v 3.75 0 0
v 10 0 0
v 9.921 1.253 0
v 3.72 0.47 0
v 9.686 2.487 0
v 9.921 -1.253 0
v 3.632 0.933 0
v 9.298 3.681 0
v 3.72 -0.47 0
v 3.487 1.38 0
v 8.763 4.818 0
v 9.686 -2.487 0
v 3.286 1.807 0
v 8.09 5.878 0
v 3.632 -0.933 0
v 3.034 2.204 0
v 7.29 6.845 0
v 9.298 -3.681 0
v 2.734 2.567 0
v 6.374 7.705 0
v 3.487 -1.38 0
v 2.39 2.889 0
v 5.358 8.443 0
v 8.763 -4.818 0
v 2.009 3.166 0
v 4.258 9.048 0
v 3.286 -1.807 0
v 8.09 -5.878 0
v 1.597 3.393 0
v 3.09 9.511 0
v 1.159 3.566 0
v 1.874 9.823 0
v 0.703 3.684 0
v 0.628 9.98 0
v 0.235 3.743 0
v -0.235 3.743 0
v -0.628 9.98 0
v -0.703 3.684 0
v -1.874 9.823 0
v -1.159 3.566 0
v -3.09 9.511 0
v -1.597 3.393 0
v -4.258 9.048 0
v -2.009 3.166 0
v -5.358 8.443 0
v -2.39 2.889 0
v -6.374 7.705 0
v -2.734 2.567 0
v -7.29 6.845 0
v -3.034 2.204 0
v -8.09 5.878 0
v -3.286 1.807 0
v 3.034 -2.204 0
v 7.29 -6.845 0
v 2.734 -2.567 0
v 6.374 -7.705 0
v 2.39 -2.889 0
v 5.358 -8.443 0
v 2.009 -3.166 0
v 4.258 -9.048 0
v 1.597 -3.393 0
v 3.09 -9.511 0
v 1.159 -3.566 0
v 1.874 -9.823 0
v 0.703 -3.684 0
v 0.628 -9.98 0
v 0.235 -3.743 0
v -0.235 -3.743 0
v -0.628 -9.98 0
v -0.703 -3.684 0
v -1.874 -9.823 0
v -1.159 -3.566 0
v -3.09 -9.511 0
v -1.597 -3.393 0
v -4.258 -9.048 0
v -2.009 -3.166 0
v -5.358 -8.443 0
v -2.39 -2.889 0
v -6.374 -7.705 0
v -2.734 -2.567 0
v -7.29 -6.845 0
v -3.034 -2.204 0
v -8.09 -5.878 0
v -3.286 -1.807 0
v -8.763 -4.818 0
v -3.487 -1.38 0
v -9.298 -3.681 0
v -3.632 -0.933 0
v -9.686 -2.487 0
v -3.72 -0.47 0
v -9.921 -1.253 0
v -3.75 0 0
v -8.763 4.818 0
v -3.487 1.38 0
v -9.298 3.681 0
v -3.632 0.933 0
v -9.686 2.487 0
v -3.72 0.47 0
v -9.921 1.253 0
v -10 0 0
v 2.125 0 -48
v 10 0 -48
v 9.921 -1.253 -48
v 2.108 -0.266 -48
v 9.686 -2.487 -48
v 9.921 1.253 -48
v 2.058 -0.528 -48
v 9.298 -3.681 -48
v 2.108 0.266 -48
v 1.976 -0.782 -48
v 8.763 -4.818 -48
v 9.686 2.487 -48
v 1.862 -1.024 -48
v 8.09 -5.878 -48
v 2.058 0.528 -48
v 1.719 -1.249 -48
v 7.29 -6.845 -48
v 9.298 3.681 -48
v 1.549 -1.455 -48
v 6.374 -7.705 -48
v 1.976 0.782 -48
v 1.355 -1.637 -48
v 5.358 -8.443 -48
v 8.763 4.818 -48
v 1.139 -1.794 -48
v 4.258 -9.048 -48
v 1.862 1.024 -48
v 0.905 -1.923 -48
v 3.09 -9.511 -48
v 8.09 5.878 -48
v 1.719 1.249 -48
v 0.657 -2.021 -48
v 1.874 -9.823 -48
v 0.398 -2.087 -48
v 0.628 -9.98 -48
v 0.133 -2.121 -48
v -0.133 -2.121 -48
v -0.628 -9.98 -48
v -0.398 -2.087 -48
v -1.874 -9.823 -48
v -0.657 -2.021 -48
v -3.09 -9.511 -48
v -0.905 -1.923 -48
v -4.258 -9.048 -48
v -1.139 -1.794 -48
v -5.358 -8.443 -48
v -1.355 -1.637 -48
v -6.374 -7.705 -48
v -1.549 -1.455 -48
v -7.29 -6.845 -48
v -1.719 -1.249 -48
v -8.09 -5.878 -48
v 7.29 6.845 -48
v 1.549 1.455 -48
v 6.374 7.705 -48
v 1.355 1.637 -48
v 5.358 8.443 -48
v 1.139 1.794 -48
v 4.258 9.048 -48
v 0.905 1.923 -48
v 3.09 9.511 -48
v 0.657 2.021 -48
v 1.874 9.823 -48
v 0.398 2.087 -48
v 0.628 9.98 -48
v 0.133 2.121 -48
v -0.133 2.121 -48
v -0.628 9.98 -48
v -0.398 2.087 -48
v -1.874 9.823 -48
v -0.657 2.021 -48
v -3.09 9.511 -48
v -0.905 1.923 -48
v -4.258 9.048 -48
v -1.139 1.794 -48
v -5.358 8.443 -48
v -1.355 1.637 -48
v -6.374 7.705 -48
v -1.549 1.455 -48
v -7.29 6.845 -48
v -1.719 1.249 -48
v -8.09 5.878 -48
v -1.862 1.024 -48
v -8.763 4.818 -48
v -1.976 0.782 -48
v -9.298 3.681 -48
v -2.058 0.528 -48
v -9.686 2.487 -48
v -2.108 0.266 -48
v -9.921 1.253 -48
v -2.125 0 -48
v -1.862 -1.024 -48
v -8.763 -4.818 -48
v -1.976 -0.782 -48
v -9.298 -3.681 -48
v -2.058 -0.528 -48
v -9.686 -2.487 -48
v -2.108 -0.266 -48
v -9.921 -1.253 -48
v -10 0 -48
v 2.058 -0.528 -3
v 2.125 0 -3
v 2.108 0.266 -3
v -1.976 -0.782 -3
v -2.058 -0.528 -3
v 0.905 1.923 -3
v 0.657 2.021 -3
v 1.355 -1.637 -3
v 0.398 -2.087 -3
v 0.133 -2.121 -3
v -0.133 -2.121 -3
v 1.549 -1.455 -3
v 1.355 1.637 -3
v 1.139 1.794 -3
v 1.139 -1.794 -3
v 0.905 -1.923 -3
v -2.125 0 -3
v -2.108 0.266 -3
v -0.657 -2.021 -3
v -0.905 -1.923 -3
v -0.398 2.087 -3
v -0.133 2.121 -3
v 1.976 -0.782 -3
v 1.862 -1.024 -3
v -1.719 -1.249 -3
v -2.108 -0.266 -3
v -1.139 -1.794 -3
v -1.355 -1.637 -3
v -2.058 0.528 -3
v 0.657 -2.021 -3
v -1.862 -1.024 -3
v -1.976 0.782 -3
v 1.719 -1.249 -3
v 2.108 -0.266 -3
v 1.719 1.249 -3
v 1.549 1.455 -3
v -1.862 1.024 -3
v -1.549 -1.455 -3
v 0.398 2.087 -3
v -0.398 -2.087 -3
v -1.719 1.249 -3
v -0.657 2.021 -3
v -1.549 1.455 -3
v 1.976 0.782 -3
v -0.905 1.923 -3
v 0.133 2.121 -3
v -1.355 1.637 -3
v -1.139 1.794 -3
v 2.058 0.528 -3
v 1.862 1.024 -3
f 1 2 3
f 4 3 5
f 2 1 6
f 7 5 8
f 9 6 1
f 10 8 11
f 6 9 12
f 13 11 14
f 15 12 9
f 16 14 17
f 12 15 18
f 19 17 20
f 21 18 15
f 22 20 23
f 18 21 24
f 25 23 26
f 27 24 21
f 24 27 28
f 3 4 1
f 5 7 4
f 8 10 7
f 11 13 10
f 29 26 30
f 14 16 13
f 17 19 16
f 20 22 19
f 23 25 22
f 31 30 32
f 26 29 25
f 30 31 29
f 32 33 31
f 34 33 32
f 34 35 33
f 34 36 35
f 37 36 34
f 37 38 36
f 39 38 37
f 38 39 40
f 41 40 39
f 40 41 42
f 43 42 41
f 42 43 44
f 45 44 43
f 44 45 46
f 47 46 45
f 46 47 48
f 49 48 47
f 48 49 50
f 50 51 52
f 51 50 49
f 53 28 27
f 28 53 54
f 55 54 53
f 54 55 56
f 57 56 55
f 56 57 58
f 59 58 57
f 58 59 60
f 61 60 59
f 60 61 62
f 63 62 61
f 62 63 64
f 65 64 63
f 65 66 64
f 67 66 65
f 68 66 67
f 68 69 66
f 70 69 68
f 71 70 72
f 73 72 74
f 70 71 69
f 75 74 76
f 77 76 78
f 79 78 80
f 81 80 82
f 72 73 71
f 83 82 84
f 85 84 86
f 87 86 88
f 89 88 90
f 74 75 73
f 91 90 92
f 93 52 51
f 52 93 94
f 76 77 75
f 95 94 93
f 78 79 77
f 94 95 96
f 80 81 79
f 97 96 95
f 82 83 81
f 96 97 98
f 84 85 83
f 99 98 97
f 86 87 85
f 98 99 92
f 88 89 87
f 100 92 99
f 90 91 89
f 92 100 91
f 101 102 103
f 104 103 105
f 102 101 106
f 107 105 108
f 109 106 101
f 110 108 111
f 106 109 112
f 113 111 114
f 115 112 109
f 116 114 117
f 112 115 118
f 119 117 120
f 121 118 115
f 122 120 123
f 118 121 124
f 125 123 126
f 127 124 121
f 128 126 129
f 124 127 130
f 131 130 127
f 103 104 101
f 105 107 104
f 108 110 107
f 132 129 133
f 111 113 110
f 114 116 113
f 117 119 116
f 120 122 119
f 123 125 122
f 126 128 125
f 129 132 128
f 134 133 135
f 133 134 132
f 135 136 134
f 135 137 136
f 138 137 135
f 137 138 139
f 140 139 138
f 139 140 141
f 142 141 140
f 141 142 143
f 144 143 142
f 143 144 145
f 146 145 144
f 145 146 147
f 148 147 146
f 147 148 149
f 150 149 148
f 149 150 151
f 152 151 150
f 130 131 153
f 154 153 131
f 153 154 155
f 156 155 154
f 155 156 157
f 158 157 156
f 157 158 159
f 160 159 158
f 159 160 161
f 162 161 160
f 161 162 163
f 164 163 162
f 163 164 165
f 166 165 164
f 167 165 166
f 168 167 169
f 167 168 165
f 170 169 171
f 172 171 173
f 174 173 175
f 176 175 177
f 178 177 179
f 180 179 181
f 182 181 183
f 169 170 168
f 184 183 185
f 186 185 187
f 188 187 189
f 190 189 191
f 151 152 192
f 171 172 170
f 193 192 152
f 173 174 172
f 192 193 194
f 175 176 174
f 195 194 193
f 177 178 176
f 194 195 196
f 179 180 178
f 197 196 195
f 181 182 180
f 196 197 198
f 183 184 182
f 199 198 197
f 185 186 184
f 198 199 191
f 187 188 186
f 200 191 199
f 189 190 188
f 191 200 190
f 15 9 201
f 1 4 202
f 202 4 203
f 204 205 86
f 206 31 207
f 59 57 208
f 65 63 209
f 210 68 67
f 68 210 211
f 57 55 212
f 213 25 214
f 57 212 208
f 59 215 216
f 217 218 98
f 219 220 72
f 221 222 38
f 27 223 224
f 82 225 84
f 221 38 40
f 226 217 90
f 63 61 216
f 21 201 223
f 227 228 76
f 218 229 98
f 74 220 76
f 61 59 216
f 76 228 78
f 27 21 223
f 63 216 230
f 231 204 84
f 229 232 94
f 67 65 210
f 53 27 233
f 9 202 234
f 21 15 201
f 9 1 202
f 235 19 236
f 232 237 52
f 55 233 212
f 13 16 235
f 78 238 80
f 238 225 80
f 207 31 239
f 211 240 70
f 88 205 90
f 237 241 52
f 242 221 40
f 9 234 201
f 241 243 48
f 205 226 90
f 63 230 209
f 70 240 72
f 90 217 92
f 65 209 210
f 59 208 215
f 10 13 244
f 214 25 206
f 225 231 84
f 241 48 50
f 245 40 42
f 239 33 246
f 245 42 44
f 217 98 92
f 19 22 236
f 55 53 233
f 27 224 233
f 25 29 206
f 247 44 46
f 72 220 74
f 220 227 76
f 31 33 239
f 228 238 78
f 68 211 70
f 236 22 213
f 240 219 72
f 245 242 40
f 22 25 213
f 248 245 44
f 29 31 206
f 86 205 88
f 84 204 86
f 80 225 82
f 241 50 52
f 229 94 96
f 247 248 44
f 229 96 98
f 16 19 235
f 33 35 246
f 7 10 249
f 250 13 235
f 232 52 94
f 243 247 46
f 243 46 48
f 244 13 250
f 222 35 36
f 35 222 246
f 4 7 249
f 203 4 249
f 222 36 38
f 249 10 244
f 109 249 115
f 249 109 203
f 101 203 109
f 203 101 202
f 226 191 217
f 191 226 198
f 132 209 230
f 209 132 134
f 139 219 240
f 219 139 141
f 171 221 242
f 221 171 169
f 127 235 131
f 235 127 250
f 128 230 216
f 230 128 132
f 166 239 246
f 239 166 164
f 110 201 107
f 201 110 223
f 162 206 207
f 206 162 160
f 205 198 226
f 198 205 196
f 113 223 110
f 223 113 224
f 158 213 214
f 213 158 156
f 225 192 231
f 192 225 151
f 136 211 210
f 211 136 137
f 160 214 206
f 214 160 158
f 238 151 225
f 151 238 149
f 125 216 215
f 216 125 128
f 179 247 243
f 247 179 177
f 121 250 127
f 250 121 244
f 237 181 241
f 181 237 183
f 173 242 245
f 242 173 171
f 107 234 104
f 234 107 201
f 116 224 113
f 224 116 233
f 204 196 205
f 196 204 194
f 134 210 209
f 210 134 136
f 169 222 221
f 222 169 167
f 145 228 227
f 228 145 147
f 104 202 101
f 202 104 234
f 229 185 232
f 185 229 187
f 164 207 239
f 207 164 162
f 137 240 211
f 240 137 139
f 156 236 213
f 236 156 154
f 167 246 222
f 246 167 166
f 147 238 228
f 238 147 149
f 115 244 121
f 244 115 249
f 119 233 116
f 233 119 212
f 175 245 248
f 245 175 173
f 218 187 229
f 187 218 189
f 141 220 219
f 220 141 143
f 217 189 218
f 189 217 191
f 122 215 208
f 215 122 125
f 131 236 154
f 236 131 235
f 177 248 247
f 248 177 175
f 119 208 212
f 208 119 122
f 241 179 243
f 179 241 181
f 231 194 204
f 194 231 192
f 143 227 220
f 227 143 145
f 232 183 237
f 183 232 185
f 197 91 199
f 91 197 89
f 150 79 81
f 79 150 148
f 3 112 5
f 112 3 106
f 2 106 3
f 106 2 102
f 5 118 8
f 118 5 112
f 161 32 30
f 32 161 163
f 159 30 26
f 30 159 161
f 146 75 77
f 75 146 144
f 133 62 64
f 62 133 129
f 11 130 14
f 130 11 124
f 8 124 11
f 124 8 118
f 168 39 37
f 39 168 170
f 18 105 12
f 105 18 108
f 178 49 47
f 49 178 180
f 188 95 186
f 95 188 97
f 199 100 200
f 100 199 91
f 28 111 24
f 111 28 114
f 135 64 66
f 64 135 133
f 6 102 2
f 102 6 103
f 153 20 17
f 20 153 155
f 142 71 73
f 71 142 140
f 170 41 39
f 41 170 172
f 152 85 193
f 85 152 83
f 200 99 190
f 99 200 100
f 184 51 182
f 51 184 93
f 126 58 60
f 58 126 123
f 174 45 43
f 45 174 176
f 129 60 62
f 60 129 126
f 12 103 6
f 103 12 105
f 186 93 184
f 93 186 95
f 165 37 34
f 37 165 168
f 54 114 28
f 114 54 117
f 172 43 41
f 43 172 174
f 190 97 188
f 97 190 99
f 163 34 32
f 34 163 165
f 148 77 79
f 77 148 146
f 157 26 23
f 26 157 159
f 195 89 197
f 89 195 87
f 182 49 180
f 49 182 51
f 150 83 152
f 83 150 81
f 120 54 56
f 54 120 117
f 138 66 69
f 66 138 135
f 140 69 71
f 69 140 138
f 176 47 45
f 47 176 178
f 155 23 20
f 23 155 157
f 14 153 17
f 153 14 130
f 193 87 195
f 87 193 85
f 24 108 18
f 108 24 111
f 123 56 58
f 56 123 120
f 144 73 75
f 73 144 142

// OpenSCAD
$fn = 50;


difference() {
	union() {
		translate(v = [0, 0, -48.0000000000]) {
			cylinder(h = 48, r = 10.0000000000);
		}
		cylinder(h = 0, r = 16.0000000000);
	}
	union() {
		translate(v = [0, 0, 0]) {
			rotate(a = [0, 0, 0]) {
				difference() {
					union() {
						#translate(v = [0, 0, -48.0000000000]) {
							cylinder(h = 48, r = 2.0000000000);
						}
						#translate(v = [0, 0, -3]) {
							cylinder(h = 3, r = 10.0000000000, r1 = 2.1250000000, r2 = 3.7500000000);
						}
						#translate(v = [0, 0, -48.0000000000]) {
							cylinder(h = 48, r = 2.1250000000);
						}
						#translate(v = [0, 0, -48.0000000000]) {
							cylinder(h = 48, r = 2.0000000000);
						}
					}
					union();
				}
			}
		}
	}
}
